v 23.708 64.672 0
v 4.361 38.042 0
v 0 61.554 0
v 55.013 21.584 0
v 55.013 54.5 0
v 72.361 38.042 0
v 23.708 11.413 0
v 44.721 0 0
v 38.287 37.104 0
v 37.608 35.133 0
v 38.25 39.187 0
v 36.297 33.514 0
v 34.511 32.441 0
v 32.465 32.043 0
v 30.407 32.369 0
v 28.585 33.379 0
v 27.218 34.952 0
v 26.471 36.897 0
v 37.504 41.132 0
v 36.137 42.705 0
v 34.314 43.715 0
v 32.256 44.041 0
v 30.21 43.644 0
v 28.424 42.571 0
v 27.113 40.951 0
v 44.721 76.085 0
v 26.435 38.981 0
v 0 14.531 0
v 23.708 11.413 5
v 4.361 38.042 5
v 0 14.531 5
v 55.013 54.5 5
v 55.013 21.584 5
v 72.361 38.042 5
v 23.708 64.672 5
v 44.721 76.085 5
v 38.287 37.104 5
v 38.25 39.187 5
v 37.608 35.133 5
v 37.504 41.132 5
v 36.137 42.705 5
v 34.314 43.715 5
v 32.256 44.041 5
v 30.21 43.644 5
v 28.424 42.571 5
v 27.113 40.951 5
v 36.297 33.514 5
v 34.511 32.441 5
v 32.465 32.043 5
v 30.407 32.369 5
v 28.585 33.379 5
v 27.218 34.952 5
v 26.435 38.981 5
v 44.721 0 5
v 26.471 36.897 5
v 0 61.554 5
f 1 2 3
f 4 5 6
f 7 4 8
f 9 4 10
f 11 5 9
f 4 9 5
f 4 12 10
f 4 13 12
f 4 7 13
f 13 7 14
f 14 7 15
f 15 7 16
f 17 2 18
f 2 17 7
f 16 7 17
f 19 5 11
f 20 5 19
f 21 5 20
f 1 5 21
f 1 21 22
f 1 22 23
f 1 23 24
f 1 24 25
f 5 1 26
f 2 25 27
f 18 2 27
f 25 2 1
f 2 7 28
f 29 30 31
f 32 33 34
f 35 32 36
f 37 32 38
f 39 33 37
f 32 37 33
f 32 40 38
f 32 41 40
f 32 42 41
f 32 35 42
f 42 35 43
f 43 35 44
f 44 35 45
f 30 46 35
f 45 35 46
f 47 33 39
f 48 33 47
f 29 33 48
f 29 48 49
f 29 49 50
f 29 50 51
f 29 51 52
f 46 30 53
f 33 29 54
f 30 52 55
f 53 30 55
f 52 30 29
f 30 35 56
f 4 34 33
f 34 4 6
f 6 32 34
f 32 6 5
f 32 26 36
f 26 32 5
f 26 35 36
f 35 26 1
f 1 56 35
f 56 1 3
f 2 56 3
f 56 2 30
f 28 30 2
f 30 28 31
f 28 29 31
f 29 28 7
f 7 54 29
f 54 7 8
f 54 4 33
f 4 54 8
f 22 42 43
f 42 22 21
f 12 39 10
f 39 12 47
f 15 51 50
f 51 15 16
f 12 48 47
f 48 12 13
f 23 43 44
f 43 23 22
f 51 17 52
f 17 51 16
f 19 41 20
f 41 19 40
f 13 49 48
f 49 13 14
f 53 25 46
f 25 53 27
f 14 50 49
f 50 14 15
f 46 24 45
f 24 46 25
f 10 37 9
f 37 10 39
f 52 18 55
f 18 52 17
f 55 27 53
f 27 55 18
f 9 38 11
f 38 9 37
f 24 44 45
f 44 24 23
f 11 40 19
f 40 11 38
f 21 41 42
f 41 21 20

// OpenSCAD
$fn = 32;

// ----------------------------------------------------------------------
// Star wheel: 5-point blunt, R40
// ----------------------------------------------------------------------

// --- parameters (mm) ---
n_points = 5;             // number of points / teeth
r_out = 40;               // tip radius
r_in = 28;                // root radius
bore_r = 6;               // centre bore radius
plate_t = 5;              // plate thickness, Z (extrusion height)
bore_d = 12;              // centre bore diameter
fit_tol = 0.1;            // declared fit tolerance (prompt contract)
free_tol = 0.5;           // declared free tolerance (prompt contract)

profile = [[72.361, 38.042], [55.013, 54.5], [44.721, 76.085], [23.708, 64.672], [0, 61.554], [4.361, 38.042], [0, 14.531], [23.708, 11.413], [44.721, 0], [55.013, 21.584]];  // primary outline, 10 points, counter clockwise
void_1 = [[38.25, 39.187], [37.504, 41.132], [36.137, 42.705], [34.314, 43.715], [32.256, 44.041], [30.21, 43.644], [28.424, 42.571], [27.113, 40.951], [26.435, 38.981], [26.471, 36.897], [27.218, 34.952], [28.585, 33.379], [30.407, 32.369], [32.465, 32.043], [34.511, 32.441], [36.297, 33.514], [37.608, 35.133], [38.287, 37.104]];  // centre bore, 18 points

// --- the one profile operation ---
difference() {
  linear_extrude(height = plate_t) polygon(points = profile);
  translate([0, 0, -1])
    linear_extrude(height = plate_t + 2) polygon(points = void_1);
}
